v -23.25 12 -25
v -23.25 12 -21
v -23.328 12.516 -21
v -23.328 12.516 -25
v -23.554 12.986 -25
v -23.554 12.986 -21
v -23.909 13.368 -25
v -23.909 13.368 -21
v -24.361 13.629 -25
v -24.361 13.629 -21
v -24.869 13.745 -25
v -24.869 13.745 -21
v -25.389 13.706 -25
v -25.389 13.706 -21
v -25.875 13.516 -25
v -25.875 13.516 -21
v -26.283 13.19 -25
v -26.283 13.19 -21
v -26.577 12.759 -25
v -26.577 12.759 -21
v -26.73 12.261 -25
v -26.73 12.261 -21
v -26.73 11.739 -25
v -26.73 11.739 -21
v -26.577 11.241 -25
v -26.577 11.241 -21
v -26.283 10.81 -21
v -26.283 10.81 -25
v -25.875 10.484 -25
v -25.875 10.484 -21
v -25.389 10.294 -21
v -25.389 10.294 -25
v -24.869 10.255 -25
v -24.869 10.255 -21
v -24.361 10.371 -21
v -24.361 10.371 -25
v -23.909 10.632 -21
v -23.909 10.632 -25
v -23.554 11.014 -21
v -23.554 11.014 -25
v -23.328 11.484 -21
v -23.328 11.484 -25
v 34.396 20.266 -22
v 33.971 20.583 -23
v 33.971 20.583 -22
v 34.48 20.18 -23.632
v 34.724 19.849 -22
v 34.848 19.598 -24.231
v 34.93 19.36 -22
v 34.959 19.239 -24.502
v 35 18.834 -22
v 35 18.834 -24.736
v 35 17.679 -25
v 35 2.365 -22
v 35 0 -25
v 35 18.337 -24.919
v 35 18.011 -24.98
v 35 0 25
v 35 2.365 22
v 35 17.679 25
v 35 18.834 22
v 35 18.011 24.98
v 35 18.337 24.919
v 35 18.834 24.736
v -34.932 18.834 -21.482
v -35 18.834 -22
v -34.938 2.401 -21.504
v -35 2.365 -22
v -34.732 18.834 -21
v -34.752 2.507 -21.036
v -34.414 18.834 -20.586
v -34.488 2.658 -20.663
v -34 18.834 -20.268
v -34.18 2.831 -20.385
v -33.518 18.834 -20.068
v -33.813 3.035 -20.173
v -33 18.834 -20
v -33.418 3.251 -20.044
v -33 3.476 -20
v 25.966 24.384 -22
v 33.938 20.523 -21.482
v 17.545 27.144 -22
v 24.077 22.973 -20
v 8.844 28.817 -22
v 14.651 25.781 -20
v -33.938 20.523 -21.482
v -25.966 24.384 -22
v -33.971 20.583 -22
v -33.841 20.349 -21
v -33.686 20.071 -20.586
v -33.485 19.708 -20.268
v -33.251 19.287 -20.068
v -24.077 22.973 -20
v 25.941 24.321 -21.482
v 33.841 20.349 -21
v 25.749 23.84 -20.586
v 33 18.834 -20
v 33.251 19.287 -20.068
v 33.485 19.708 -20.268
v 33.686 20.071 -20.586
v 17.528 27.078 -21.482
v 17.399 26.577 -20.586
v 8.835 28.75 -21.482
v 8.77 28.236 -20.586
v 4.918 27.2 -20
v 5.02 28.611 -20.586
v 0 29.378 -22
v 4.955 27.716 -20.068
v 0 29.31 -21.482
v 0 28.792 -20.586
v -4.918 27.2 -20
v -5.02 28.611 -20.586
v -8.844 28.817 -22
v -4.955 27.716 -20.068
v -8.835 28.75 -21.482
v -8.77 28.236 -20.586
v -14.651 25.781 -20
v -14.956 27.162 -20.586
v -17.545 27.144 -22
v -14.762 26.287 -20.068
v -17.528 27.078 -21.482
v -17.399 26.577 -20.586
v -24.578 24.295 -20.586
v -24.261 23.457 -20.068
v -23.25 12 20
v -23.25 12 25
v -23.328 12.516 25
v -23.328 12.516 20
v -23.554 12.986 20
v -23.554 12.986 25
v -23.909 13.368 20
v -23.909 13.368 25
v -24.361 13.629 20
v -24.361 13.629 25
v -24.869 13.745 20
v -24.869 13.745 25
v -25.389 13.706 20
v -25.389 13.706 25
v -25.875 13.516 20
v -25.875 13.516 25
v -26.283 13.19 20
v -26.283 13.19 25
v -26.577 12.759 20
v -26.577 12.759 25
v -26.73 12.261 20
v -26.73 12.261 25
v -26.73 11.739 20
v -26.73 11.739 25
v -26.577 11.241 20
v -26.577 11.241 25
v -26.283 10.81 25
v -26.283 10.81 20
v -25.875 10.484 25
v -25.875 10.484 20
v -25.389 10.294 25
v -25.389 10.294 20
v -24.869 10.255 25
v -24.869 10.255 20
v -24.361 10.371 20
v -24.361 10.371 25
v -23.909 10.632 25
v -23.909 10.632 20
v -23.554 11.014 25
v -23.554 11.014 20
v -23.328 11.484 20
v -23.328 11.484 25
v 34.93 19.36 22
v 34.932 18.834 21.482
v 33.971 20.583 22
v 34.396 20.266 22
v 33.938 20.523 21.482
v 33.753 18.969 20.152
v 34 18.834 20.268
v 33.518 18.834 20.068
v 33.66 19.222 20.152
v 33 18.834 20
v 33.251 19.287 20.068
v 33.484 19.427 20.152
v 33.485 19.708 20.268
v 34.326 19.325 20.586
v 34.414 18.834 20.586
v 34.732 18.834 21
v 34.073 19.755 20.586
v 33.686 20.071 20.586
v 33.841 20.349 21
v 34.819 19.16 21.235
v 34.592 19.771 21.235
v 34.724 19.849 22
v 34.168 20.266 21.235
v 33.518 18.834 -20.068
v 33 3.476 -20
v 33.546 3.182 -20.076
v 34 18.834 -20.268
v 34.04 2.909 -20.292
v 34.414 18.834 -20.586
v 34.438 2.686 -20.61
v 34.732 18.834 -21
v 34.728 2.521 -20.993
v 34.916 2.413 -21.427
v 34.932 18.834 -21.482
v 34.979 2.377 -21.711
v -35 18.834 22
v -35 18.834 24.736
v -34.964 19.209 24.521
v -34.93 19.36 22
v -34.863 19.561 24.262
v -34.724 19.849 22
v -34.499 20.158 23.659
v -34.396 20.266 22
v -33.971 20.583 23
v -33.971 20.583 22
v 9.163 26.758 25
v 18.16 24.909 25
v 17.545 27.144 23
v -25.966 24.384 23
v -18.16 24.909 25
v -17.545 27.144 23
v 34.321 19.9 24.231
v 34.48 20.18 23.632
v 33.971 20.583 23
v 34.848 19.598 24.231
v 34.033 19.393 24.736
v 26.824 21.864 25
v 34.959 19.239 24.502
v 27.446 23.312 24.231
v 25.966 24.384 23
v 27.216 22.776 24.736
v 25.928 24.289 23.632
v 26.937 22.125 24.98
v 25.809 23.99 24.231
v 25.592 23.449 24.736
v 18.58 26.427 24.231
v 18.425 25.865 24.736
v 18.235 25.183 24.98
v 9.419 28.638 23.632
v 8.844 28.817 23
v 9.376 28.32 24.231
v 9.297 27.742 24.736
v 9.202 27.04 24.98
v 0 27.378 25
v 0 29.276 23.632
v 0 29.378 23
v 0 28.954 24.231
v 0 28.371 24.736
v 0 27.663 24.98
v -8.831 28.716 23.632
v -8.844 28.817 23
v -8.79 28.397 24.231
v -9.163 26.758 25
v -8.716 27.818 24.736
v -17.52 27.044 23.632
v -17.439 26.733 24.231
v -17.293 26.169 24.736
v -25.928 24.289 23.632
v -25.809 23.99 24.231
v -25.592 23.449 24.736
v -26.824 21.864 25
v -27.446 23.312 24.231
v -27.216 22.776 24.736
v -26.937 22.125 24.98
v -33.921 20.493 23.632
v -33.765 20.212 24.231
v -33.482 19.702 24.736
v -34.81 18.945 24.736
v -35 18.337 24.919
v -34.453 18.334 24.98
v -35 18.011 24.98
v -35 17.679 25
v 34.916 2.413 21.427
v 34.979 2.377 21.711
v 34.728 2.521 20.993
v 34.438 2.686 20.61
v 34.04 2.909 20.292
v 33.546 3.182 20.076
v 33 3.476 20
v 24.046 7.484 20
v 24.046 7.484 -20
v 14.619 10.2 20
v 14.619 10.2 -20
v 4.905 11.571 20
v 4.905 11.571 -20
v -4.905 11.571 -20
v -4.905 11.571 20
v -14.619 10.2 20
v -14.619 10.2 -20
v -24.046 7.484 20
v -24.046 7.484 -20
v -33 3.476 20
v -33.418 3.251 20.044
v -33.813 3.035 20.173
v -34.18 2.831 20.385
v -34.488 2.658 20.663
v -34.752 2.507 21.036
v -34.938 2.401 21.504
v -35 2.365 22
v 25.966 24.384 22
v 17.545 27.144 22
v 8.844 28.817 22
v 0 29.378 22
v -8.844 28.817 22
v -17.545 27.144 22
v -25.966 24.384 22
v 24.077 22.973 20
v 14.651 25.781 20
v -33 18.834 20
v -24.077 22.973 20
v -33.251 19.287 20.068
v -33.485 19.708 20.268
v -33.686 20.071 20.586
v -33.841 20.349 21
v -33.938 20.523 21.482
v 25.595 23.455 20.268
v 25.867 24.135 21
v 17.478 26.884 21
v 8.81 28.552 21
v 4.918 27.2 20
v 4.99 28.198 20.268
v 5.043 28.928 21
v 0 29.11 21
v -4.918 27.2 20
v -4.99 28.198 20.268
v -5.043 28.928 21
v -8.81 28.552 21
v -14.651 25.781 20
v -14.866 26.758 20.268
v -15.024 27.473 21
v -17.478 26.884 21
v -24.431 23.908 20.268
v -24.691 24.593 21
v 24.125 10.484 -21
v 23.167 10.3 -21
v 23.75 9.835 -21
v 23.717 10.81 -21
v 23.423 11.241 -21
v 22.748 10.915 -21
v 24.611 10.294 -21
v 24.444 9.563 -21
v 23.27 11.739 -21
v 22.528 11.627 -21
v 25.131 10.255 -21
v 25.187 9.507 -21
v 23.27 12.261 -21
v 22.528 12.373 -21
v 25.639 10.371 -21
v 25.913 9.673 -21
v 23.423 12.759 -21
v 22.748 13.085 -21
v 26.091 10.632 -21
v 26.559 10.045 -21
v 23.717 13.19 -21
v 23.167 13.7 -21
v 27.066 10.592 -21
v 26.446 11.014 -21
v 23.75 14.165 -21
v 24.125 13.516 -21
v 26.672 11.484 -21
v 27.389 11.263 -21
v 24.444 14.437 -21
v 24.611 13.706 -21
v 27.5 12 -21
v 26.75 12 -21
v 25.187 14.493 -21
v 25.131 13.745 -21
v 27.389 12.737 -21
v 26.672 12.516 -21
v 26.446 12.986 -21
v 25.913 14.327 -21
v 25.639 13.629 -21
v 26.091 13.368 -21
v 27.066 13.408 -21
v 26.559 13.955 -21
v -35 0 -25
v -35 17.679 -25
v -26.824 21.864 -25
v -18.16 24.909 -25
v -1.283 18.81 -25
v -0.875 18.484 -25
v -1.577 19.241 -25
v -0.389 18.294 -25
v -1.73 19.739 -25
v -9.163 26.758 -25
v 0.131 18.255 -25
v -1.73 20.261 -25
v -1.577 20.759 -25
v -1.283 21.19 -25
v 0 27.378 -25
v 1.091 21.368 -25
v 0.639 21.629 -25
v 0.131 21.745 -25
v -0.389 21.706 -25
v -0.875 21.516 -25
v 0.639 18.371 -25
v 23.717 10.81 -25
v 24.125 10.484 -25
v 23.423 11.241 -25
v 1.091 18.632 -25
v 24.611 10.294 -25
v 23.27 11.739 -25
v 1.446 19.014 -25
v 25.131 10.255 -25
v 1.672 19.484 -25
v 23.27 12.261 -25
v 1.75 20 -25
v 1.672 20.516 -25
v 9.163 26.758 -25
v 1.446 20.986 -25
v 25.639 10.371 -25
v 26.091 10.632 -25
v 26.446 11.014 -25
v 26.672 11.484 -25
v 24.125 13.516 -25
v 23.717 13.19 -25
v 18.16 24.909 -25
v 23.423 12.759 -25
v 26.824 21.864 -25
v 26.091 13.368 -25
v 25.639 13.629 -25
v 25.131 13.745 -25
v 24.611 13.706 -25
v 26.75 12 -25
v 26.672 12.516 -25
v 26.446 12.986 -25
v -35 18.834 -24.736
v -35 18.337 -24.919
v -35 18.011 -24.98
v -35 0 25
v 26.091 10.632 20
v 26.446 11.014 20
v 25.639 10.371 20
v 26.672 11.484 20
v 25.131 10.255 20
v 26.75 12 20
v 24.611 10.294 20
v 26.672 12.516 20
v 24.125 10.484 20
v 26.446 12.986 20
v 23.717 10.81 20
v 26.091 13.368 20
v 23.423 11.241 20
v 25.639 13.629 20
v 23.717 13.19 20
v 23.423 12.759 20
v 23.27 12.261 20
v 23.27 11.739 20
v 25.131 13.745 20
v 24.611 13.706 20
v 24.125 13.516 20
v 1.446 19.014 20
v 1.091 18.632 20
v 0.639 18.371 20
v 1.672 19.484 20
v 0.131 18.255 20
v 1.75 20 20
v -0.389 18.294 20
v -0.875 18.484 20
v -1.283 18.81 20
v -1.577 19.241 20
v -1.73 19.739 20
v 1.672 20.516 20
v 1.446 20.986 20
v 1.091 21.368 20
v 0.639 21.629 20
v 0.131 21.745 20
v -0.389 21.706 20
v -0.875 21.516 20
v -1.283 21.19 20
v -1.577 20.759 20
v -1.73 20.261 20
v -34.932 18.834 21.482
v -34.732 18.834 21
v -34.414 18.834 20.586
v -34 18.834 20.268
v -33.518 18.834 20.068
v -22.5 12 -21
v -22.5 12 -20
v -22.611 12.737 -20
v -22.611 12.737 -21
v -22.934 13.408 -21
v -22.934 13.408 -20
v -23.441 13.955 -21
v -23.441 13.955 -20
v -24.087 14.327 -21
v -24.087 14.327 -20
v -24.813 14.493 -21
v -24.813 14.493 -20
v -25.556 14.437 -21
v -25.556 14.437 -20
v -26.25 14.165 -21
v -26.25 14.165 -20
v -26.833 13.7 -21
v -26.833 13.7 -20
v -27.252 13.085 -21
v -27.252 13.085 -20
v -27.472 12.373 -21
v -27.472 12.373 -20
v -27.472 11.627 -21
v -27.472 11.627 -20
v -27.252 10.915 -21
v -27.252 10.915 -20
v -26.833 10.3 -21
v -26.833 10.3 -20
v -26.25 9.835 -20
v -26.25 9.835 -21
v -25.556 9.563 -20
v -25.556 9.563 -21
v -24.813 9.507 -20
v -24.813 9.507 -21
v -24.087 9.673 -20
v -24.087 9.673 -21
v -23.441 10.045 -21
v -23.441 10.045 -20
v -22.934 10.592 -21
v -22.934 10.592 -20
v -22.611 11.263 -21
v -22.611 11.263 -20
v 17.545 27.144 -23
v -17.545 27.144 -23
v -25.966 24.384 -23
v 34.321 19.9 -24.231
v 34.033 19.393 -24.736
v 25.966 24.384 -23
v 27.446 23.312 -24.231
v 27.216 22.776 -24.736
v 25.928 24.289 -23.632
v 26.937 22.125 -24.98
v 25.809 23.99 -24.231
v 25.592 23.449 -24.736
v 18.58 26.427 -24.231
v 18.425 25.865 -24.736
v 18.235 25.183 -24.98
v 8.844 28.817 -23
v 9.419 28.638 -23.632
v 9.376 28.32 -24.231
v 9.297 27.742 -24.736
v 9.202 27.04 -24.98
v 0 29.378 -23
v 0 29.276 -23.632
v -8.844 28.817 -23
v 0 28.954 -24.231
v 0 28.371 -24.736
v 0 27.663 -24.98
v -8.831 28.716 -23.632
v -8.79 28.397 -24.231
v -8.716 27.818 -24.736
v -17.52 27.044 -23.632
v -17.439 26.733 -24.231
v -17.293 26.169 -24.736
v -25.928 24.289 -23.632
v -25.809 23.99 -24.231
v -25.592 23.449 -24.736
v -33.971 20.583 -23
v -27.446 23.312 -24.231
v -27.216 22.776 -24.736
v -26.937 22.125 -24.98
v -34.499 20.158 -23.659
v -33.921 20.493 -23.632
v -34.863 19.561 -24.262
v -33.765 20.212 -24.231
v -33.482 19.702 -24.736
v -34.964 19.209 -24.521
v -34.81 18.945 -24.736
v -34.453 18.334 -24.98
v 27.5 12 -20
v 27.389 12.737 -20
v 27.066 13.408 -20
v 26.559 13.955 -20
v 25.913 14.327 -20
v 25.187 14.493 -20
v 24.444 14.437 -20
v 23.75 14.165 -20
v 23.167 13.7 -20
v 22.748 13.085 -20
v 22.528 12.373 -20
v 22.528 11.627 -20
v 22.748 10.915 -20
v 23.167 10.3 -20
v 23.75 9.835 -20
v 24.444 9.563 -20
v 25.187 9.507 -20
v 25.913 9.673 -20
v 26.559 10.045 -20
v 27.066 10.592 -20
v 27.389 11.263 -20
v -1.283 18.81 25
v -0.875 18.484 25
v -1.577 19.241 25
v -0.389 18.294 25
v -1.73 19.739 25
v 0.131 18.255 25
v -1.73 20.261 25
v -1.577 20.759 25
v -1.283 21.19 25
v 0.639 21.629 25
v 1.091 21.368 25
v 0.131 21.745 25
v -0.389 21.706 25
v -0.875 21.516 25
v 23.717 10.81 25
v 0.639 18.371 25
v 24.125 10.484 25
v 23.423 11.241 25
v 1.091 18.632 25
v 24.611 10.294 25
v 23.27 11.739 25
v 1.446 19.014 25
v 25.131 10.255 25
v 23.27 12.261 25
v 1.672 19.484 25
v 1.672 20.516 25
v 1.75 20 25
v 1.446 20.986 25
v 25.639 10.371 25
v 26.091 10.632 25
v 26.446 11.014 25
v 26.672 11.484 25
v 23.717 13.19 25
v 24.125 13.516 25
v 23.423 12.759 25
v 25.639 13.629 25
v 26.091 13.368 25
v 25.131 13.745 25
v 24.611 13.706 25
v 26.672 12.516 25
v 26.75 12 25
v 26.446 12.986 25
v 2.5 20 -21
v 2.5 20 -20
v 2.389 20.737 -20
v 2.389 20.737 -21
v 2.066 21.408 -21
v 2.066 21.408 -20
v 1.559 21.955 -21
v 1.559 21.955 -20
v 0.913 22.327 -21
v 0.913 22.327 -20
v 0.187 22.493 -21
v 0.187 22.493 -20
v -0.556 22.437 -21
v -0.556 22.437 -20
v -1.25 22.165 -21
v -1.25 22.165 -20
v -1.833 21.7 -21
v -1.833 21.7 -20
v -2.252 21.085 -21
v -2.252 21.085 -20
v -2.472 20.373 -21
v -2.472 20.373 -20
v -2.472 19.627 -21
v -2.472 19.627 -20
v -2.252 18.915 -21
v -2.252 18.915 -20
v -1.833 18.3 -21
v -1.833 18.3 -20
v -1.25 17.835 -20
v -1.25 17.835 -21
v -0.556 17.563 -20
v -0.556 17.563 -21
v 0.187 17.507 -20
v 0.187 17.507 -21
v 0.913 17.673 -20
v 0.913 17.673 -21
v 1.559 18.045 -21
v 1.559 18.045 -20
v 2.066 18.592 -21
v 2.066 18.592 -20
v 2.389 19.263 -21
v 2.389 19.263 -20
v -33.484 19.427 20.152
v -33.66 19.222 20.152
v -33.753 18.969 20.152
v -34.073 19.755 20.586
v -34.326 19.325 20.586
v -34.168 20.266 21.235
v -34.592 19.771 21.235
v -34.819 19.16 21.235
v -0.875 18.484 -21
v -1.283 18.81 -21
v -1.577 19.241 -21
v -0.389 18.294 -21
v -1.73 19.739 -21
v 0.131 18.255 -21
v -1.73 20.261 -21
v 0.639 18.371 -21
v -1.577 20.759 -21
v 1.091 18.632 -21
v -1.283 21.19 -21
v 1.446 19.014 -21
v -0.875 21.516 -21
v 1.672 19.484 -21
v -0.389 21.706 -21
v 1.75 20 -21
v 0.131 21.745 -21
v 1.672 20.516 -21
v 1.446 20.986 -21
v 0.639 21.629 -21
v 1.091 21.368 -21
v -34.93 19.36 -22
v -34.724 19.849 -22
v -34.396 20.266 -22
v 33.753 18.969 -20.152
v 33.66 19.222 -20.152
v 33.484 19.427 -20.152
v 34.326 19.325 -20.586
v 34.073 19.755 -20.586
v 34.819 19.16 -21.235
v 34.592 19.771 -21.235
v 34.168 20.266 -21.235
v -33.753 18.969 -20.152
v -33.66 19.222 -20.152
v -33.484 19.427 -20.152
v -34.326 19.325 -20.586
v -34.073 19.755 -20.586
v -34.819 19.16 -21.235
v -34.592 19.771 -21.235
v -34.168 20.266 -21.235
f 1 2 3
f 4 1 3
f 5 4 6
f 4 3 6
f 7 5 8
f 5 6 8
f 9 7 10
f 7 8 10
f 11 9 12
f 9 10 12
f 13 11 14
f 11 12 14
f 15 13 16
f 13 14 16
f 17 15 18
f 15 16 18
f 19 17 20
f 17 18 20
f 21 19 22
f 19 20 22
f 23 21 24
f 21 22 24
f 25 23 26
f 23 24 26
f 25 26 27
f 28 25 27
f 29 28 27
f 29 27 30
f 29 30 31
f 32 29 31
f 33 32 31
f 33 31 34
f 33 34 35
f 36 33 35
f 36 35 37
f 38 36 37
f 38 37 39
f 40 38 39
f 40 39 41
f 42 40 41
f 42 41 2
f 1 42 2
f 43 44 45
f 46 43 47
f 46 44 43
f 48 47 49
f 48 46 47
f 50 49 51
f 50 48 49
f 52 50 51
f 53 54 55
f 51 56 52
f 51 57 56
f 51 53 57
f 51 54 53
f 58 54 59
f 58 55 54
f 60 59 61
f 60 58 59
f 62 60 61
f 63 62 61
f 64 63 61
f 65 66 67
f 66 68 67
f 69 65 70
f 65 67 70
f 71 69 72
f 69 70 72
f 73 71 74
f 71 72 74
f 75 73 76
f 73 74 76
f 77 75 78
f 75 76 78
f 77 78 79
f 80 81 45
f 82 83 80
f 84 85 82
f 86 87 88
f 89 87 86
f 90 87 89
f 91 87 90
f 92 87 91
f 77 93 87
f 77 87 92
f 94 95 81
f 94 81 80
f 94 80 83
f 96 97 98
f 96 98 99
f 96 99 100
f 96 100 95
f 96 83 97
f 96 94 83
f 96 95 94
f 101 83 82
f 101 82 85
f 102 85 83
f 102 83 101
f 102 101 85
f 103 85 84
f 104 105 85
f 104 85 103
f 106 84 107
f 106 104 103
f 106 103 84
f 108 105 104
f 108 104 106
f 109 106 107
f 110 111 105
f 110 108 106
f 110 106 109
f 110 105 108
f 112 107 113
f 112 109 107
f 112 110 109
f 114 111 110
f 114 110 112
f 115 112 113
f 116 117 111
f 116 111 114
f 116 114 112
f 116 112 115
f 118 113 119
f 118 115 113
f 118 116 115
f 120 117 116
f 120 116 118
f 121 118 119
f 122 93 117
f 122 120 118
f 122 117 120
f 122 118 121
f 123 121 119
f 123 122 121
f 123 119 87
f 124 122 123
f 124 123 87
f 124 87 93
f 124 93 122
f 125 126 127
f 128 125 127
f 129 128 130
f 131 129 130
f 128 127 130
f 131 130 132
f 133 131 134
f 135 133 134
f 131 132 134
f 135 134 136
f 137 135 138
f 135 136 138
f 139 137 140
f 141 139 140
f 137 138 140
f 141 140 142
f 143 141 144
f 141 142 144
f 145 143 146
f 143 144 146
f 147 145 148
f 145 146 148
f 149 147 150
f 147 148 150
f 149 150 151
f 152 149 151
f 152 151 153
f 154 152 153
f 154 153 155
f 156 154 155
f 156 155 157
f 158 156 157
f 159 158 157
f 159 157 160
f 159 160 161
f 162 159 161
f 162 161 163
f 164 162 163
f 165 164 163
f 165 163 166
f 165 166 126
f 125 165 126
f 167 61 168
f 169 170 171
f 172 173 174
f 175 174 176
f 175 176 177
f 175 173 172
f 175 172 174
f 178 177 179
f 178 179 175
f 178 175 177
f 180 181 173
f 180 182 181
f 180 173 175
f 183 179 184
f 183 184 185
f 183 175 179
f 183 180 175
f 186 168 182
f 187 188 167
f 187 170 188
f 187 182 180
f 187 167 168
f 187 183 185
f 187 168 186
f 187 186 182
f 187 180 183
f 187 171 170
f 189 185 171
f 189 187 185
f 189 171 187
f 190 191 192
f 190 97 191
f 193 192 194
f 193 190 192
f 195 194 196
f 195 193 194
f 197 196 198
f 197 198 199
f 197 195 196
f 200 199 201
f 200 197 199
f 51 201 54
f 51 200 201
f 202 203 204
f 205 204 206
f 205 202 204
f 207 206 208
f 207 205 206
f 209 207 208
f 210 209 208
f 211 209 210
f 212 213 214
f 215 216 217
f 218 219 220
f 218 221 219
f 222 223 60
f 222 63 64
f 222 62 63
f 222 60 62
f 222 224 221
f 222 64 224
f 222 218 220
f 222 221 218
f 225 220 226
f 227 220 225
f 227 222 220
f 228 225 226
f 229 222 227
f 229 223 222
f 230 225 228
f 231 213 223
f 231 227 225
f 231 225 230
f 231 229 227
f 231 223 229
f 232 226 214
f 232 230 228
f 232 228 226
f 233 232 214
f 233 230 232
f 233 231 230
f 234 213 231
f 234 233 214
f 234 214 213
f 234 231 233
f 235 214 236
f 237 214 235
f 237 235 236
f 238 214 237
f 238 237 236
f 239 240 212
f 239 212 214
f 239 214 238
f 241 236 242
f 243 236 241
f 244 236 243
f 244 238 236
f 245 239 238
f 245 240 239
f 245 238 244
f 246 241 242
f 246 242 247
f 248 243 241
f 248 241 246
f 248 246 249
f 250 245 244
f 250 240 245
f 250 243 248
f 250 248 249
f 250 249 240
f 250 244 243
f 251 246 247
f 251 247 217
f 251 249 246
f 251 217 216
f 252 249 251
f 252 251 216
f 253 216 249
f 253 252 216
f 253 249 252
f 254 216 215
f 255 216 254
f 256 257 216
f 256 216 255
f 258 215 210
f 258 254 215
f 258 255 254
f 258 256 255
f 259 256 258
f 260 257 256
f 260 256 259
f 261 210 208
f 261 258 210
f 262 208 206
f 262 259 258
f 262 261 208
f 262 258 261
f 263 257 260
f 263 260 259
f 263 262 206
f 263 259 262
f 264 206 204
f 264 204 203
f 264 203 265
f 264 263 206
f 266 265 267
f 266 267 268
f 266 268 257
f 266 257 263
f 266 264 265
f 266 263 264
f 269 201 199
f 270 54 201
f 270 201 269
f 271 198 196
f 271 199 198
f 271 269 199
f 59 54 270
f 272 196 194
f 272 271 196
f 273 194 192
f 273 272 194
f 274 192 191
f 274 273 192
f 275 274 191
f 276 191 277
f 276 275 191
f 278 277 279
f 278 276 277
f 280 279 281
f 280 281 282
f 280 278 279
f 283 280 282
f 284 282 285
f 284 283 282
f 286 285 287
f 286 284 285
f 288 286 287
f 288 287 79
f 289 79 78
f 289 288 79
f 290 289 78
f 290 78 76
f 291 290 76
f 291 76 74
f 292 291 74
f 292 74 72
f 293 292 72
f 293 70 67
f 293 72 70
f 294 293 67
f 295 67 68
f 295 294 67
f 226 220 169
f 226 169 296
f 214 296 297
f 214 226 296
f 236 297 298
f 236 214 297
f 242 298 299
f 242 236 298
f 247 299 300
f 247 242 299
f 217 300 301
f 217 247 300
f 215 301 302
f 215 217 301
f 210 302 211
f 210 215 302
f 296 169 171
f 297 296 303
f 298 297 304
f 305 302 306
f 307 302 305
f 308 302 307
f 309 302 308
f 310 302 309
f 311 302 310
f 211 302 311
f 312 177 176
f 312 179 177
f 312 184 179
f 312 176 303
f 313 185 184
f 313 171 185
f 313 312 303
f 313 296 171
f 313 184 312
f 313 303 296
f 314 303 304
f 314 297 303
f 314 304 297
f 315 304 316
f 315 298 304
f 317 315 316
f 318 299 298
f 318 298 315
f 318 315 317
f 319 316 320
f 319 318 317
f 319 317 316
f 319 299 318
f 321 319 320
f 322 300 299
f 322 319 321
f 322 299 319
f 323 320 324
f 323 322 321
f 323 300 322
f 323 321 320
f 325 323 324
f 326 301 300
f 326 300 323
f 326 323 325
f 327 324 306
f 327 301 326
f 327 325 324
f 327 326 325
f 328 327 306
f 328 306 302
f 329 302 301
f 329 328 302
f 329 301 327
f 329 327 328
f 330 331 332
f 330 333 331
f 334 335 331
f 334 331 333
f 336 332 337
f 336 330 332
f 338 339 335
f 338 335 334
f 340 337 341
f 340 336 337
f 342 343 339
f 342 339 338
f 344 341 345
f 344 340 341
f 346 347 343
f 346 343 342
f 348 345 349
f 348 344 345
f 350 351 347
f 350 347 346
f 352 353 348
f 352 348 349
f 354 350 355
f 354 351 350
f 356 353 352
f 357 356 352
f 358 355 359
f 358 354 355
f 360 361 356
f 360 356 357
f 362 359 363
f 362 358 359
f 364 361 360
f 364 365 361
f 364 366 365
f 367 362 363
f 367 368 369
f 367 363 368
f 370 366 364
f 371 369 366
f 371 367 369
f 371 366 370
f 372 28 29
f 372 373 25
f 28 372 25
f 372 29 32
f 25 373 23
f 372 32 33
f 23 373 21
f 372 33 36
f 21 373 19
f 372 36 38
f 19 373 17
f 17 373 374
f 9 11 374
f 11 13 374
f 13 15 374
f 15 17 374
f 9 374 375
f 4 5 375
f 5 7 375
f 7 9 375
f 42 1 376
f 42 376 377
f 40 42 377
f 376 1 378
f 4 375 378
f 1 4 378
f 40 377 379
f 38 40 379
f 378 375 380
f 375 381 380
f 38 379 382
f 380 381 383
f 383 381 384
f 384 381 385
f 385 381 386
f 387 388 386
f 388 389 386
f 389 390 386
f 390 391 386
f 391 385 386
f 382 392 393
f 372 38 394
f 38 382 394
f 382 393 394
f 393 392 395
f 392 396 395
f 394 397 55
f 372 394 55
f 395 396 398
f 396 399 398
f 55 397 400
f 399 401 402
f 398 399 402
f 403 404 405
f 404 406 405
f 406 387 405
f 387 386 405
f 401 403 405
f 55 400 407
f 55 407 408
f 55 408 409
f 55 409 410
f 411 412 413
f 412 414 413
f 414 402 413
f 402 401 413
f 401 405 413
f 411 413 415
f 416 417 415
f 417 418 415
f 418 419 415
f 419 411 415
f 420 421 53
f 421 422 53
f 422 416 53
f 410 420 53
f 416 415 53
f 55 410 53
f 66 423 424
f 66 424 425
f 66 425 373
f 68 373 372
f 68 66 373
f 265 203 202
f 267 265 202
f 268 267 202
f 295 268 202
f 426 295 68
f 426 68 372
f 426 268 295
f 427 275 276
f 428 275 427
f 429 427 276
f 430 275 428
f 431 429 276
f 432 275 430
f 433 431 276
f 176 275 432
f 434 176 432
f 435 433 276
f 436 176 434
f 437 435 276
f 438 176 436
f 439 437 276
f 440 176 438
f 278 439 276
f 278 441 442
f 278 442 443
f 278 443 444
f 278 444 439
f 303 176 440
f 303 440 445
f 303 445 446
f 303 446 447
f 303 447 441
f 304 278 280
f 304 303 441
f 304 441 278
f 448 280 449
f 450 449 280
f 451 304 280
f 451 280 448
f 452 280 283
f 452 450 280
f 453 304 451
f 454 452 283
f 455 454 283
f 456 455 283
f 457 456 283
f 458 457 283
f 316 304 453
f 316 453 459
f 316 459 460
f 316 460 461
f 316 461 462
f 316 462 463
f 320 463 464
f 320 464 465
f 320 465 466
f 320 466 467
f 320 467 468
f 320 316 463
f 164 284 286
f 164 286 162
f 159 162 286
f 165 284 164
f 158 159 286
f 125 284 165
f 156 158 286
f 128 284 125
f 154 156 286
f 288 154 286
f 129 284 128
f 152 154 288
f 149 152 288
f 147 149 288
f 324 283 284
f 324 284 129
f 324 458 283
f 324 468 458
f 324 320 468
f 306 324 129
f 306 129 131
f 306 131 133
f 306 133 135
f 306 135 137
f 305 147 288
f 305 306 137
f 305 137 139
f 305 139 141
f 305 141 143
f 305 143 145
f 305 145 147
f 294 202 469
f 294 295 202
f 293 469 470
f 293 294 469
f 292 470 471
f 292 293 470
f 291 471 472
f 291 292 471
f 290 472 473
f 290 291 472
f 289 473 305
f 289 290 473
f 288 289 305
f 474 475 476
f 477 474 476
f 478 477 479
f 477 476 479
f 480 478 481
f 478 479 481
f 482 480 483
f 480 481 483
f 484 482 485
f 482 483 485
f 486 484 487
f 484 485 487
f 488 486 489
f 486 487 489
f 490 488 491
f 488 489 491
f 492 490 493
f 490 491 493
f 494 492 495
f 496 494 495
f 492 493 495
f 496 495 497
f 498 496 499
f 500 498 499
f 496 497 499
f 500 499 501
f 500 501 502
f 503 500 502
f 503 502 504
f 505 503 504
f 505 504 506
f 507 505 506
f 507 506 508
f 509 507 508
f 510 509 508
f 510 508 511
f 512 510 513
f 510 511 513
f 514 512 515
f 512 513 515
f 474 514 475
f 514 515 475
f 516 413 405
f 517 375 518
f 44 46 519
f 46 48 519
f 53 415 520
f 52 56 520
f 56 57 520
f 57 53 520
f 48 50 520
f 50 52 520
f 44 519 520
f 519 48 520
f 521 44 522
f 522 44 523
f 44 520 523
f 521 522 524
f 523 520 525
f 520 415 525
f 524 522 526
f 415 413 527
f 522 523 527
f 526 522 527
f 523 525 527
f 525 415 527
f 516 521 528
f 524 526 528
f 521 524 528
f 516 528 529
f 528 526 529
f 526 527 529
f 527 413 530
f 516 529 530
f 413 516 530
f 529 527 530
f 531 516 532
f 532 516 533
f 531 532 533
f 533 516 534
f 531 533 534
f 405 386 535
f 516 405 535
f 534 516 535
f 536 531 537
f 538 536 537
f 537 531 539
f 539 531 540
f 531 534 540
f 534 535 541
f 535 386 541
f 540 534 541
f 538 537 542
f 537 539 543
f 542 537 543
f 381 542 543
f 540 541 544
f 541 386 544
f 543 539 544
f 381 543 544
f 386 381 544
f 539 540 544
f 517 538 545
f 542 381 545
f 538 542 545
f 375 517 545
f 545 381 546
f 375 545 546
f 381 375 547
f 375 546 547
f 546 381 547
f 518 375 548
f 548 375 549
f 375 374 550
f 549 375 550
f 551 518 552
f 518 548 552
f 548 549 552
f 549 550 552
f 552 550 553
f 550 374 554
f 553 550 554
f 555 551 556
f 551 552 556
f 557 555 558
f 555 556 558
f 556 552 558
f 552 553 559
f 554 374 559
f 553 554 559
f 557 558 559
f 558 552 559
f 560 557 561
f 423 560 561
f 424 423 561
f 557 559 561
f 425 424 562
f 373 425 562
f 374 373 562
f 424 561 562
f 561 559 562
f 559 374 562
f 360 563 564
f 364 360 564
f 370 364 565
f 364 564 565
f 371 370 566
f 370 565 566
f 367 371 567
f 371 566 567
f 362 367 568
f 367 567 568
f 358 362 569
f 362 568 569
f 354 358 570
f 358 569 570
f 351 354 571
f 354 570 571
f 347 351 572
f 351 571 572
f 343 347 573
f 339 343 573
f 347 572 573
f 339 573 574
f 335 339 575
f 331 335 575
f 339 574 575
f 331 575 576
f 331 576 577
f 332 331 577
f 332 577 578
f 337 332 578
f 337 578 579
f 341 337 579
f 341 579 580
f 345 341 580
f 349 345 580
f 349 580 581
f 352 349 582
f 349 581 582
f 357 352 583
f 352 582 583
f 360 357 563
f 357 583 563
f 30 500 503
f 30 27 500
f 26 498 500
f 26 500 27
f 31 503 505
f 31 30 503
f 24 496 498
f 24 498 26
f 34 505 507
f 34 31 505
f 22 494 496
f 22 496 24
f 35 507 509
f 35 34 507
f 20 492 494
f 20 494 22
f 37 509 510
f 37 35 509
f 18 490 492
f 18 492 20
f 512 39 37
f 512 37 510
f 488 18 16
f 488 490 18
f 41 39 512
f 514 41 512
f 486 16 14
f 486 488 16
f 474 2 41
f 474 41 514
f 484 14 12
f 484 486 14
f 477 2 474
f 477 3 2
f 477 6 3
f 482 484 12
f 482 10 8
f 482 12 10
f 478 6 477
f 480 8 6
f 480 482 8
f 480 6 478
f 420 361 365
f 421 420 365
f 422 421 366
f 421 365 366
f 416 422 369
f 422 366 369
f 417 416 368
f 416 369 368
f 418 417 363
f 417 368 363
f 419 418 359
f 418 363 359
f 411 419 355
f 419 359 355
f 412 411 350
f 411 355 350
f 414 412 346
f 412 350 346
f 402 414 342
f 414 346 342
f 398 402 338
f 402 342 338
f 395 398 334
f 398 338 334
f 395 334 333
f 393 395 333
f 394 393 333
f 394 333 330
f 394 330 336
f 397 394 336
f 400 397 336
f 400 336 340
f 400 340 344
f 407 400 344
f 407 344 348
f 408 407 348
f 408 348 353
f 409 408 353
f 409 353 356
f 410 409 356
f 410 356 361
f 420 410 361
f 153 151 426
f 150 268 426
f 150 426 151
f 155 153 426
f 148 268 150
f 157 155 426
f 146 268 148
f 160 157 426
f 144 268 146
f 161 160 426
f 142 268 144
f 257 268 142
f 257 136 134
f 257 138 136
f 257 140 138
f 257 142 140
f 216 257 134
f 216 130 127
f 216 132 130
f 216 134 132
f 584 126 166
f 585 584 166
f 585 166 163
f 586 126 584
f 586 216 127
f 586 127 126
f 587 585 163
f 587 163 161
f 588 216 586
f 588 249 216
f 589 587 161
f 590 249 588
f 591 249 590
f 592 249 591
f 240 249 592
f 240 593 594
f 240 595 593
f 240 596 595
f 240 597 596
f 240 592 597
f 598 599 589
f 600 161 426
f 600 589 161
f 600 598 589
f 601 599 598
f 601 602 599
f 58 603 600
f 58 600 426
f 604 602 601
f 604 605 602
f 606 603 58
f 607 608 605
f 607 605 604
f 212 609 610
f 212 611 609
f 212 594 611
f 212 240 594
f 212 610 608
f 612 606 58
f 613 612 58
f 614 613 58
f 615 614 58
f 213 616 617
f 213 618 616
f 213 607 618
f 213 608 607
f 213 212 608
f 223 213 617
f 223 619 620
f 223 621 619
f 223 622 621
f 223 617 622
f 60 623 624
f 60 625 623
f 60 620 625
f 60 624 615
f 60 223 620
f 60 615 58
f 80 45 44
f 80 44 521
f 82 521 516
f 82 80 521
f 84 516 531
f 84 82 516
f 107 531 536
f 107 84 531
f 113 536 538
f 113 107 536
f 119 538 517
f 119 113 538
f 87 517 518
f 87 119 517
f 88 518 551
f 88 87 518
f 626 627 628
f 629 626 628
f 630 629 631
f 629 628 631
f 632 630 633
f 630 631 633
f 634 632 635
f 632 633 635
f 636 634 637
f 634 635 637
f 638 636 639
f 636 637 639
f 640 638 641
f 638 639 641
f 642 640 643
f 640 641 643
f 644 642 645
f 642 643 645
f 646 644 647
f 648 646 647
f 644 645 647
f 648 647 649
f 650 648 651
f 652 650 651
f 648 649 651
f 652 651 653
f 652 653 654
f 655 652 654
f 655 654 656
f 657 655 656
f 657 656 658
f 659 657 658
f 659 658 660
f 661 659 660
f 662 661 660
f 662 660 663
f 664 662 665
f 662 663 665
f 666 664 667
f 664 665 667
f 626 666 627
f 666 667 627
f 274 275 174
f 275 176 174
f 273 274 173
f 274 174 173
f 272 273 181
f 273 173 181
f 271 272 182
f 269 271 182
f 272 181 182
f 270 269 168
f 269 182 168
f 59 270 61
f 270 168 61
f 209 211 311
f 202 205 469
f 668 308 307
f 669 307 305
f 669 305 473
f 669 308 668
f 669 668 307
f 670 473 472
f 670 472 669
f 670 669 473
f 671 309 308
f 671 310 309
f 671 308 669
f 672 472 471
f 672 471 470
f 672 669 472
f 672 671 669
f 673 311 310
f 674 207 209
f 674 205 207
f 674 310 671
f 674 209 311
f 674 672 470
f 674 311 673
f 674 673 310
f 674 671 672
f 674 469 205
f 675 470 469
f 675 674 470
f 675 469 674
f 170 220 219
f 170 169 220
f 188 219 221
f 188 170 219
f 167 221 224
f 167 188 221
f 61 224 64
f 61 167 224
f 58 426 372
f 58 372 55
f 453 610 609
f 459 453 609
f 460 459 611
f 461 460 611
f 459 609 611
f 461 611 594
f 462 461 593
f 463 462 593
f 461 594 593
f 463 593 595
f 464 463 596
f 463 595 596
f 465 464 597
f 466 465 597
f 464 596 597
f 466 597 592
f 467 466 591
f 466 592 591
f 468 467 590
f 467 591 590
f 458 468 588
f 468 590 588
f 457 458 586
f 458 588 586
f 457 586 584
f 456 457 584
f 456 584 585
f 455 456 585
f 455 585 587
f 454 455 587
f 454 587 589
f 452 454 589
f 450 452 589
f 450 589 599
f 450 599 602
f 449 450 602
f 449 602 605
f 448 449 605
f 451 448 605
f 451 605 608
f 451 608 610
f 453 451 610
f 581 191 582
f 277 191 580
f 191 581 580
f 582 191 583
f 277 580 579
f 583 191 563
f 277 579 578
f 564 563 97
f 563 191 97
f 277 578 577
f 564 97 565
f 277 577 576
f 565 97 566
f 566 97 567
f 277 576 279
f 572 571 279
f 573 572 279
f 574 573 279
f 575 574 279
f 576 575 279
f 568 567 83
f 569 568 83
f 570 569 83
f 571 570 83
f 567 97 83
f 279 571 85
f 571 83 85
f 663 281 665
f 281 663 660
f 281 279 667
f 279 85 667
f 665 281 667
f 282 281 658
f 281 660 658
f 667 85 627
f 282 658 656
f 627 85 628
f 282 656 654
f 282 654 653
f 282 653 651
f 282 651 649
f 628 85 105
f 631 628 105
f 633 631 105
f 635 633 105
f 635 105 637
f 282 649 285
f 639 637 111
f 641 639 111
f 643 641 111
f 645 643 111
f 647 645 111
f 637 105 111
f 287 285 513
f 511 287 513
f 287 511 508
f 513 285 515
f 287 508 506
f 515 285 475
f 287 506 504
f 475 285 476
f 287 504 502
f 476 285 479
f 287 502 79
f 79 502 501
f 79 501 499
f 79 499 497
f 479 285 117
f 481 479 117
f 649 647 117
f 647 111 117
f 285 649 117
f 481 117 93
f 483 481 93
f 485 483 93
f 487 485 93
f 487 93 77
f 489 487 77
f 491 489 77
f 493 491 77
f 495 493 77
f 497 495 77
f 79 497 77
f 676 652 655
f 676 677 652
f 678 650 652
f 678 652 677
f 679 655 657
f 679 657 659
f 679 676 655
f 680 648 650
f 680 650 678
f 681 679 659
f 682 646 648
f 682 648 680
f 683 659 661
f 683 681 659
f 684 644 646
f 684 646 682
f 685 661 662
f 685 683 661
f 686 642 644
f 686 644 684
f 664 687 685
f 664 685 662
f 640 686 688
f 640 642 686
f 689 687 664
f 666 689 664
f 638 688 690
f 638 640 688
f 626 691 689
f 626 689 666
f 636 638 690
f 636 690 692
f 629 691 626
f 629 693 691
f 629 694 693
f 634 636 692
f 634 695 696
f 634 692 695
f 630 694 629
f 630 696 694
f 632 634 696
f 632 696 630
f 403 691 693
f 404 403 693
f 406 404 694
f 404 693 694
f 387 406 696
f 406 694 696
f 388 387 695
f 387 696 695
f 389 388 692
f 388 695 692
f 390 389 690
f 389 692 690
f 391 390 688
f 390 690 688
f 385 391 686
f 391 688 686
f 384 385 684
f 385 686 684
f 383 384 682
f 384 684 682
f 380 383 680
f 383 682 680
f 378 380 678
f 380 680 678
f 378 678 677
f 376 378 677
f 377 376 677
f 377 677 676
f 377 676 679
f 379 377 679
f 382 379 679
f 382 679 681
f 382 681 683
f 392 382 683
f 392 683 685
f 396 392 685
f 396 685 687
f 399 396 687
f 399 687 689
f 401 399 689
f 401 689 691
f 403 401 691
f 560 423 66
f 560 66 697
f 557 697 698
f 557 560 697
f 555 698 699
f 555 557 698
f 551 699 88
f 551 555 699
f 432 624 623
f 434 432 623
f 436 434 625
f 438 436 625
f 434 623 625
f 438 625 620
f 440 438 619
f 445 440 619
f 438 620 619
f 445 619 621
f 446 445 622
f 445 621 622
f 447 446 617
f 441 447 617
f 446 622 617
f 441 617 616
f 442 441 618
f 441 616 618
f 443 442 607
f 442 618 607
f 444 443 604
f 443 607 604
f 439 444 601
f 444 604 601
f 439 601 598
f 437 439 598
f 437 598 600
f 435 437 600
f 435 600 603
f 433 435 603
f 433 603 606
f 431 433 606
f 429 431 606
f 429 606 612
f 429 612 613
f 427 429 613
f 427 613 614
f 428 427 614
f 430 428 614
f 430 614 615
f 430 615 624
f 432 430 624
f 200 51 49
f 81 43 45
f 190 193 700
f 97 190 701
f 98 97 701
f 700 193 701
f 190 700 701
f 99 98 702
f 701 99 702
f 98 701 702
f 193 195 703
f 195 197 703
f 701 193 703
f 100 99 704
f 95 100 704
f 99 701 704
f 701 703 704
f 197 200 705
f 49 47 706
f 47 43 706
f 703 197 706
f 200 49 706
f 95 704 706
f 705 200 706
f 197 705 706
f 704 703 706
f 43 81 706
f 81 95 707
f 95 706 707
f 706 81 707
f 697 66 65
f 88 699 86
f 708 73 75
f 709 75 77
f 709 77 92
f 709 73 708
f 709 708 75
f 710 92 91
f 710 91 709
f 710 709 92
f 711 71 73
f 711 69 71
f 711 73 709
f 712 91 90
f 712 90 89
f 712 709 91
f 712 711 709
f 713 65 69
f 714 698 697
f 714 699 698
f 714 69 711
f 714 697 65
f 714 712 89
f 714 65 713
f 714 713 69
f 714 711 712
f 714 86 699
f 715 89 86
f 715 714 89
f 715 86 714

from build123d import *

# Parameters (mm, degrees)
PAD001_DEPTH    = 25
POCKET_DEPTH    = 20
FILLET_R        = 2
SKETCH002_R     = 1.75
POCKET001_DEPTH = 50.001
SKETCH003_R     = 2.5
POCKET002_DEPTH = 1


with BuildPart() as part:
    # Sketch001 → Pad001 (new body, symmetric)
    with BuildSketch(Plane.XY):
        with BuildLine():
            Line((-35, 20), (-35, 0))
            Line((-35, 0), (35, 0))
            Line((35, 0), (35, 20))
            ThreePointArc((35, 20), (0, 29.378222), (-35, 20))
        make_face()
    extrude(amount=PAD001_DEPTH, both=True)

    # Sketch → Pocket (cut, symmetric)
    with BuildSketch(Plane.XY):
        with BuildLine():
            ThreePointArc((37.264344, 1), (0, 11.743197), (-37.264344, 1))
            Line((-37.264344, 1), (-37.264344, 41.61153))
            Line((-37.264344, 41.61153), (37.264344, 41.61153))
            Line((37.264344, 41.61153), (37.264344, 1))
        make_face()
    extrude(amount=POCKET_DEPTH, both=True, mode=Mode.SUBTRACT)

    # Fillet
    fillet_edges = [part.edges().sort_by_distance(p)[0] for p in [
        (0, 29.378222, 25),
        (-35, 20, 22.5),
        (0, 29.378222, 20),
        (0, 29.378222, -20),
        (-35, 20, -22.5),
        (0, 29.378222, -25),
        (35, 20, 22.5),
        (35, 20, -22.5),
        (35, 11.182488, -20),
        (35, 11.182488, 20),
        (-35, 11.182488, -20),
        (-35, 11.182488, 20),
    ]]
    fillet(fillet_edges, radius=FILLET_R)

    # Sketch002 (on DatumPlane) → Pocket001 (cut, through all)
    with BuildSketch(Plane.XY.offset(25)):
        with Locations((0, 20)):
            Circle(SKETCH002_R)
        with Locations((25, 12)):
            Circle(SKETCH002_R)
        with Locations((-25, 12)):
            Circle(SKETCH002_R)
    extrude(amount=-POCKET001_DEPTH, mode=Mode.SUBTRACT)

    # Sketch003 (on DatumPlane) → Pocket002 (cut)
    with BuildSketch(Plane.XY.offset(-20)):
        with Locations((0, 20)):
            Circle(SKETCH003_R)
        with Locations((-25, 12)):
            Circle(SKETCH003_R)
        with Locations((25, 12)):
            Circle(SKETCH003_R)
    extrude(amount=-POCKET002_DEPTH, mode=Mode.SUBTRACT)


solid = part.part
